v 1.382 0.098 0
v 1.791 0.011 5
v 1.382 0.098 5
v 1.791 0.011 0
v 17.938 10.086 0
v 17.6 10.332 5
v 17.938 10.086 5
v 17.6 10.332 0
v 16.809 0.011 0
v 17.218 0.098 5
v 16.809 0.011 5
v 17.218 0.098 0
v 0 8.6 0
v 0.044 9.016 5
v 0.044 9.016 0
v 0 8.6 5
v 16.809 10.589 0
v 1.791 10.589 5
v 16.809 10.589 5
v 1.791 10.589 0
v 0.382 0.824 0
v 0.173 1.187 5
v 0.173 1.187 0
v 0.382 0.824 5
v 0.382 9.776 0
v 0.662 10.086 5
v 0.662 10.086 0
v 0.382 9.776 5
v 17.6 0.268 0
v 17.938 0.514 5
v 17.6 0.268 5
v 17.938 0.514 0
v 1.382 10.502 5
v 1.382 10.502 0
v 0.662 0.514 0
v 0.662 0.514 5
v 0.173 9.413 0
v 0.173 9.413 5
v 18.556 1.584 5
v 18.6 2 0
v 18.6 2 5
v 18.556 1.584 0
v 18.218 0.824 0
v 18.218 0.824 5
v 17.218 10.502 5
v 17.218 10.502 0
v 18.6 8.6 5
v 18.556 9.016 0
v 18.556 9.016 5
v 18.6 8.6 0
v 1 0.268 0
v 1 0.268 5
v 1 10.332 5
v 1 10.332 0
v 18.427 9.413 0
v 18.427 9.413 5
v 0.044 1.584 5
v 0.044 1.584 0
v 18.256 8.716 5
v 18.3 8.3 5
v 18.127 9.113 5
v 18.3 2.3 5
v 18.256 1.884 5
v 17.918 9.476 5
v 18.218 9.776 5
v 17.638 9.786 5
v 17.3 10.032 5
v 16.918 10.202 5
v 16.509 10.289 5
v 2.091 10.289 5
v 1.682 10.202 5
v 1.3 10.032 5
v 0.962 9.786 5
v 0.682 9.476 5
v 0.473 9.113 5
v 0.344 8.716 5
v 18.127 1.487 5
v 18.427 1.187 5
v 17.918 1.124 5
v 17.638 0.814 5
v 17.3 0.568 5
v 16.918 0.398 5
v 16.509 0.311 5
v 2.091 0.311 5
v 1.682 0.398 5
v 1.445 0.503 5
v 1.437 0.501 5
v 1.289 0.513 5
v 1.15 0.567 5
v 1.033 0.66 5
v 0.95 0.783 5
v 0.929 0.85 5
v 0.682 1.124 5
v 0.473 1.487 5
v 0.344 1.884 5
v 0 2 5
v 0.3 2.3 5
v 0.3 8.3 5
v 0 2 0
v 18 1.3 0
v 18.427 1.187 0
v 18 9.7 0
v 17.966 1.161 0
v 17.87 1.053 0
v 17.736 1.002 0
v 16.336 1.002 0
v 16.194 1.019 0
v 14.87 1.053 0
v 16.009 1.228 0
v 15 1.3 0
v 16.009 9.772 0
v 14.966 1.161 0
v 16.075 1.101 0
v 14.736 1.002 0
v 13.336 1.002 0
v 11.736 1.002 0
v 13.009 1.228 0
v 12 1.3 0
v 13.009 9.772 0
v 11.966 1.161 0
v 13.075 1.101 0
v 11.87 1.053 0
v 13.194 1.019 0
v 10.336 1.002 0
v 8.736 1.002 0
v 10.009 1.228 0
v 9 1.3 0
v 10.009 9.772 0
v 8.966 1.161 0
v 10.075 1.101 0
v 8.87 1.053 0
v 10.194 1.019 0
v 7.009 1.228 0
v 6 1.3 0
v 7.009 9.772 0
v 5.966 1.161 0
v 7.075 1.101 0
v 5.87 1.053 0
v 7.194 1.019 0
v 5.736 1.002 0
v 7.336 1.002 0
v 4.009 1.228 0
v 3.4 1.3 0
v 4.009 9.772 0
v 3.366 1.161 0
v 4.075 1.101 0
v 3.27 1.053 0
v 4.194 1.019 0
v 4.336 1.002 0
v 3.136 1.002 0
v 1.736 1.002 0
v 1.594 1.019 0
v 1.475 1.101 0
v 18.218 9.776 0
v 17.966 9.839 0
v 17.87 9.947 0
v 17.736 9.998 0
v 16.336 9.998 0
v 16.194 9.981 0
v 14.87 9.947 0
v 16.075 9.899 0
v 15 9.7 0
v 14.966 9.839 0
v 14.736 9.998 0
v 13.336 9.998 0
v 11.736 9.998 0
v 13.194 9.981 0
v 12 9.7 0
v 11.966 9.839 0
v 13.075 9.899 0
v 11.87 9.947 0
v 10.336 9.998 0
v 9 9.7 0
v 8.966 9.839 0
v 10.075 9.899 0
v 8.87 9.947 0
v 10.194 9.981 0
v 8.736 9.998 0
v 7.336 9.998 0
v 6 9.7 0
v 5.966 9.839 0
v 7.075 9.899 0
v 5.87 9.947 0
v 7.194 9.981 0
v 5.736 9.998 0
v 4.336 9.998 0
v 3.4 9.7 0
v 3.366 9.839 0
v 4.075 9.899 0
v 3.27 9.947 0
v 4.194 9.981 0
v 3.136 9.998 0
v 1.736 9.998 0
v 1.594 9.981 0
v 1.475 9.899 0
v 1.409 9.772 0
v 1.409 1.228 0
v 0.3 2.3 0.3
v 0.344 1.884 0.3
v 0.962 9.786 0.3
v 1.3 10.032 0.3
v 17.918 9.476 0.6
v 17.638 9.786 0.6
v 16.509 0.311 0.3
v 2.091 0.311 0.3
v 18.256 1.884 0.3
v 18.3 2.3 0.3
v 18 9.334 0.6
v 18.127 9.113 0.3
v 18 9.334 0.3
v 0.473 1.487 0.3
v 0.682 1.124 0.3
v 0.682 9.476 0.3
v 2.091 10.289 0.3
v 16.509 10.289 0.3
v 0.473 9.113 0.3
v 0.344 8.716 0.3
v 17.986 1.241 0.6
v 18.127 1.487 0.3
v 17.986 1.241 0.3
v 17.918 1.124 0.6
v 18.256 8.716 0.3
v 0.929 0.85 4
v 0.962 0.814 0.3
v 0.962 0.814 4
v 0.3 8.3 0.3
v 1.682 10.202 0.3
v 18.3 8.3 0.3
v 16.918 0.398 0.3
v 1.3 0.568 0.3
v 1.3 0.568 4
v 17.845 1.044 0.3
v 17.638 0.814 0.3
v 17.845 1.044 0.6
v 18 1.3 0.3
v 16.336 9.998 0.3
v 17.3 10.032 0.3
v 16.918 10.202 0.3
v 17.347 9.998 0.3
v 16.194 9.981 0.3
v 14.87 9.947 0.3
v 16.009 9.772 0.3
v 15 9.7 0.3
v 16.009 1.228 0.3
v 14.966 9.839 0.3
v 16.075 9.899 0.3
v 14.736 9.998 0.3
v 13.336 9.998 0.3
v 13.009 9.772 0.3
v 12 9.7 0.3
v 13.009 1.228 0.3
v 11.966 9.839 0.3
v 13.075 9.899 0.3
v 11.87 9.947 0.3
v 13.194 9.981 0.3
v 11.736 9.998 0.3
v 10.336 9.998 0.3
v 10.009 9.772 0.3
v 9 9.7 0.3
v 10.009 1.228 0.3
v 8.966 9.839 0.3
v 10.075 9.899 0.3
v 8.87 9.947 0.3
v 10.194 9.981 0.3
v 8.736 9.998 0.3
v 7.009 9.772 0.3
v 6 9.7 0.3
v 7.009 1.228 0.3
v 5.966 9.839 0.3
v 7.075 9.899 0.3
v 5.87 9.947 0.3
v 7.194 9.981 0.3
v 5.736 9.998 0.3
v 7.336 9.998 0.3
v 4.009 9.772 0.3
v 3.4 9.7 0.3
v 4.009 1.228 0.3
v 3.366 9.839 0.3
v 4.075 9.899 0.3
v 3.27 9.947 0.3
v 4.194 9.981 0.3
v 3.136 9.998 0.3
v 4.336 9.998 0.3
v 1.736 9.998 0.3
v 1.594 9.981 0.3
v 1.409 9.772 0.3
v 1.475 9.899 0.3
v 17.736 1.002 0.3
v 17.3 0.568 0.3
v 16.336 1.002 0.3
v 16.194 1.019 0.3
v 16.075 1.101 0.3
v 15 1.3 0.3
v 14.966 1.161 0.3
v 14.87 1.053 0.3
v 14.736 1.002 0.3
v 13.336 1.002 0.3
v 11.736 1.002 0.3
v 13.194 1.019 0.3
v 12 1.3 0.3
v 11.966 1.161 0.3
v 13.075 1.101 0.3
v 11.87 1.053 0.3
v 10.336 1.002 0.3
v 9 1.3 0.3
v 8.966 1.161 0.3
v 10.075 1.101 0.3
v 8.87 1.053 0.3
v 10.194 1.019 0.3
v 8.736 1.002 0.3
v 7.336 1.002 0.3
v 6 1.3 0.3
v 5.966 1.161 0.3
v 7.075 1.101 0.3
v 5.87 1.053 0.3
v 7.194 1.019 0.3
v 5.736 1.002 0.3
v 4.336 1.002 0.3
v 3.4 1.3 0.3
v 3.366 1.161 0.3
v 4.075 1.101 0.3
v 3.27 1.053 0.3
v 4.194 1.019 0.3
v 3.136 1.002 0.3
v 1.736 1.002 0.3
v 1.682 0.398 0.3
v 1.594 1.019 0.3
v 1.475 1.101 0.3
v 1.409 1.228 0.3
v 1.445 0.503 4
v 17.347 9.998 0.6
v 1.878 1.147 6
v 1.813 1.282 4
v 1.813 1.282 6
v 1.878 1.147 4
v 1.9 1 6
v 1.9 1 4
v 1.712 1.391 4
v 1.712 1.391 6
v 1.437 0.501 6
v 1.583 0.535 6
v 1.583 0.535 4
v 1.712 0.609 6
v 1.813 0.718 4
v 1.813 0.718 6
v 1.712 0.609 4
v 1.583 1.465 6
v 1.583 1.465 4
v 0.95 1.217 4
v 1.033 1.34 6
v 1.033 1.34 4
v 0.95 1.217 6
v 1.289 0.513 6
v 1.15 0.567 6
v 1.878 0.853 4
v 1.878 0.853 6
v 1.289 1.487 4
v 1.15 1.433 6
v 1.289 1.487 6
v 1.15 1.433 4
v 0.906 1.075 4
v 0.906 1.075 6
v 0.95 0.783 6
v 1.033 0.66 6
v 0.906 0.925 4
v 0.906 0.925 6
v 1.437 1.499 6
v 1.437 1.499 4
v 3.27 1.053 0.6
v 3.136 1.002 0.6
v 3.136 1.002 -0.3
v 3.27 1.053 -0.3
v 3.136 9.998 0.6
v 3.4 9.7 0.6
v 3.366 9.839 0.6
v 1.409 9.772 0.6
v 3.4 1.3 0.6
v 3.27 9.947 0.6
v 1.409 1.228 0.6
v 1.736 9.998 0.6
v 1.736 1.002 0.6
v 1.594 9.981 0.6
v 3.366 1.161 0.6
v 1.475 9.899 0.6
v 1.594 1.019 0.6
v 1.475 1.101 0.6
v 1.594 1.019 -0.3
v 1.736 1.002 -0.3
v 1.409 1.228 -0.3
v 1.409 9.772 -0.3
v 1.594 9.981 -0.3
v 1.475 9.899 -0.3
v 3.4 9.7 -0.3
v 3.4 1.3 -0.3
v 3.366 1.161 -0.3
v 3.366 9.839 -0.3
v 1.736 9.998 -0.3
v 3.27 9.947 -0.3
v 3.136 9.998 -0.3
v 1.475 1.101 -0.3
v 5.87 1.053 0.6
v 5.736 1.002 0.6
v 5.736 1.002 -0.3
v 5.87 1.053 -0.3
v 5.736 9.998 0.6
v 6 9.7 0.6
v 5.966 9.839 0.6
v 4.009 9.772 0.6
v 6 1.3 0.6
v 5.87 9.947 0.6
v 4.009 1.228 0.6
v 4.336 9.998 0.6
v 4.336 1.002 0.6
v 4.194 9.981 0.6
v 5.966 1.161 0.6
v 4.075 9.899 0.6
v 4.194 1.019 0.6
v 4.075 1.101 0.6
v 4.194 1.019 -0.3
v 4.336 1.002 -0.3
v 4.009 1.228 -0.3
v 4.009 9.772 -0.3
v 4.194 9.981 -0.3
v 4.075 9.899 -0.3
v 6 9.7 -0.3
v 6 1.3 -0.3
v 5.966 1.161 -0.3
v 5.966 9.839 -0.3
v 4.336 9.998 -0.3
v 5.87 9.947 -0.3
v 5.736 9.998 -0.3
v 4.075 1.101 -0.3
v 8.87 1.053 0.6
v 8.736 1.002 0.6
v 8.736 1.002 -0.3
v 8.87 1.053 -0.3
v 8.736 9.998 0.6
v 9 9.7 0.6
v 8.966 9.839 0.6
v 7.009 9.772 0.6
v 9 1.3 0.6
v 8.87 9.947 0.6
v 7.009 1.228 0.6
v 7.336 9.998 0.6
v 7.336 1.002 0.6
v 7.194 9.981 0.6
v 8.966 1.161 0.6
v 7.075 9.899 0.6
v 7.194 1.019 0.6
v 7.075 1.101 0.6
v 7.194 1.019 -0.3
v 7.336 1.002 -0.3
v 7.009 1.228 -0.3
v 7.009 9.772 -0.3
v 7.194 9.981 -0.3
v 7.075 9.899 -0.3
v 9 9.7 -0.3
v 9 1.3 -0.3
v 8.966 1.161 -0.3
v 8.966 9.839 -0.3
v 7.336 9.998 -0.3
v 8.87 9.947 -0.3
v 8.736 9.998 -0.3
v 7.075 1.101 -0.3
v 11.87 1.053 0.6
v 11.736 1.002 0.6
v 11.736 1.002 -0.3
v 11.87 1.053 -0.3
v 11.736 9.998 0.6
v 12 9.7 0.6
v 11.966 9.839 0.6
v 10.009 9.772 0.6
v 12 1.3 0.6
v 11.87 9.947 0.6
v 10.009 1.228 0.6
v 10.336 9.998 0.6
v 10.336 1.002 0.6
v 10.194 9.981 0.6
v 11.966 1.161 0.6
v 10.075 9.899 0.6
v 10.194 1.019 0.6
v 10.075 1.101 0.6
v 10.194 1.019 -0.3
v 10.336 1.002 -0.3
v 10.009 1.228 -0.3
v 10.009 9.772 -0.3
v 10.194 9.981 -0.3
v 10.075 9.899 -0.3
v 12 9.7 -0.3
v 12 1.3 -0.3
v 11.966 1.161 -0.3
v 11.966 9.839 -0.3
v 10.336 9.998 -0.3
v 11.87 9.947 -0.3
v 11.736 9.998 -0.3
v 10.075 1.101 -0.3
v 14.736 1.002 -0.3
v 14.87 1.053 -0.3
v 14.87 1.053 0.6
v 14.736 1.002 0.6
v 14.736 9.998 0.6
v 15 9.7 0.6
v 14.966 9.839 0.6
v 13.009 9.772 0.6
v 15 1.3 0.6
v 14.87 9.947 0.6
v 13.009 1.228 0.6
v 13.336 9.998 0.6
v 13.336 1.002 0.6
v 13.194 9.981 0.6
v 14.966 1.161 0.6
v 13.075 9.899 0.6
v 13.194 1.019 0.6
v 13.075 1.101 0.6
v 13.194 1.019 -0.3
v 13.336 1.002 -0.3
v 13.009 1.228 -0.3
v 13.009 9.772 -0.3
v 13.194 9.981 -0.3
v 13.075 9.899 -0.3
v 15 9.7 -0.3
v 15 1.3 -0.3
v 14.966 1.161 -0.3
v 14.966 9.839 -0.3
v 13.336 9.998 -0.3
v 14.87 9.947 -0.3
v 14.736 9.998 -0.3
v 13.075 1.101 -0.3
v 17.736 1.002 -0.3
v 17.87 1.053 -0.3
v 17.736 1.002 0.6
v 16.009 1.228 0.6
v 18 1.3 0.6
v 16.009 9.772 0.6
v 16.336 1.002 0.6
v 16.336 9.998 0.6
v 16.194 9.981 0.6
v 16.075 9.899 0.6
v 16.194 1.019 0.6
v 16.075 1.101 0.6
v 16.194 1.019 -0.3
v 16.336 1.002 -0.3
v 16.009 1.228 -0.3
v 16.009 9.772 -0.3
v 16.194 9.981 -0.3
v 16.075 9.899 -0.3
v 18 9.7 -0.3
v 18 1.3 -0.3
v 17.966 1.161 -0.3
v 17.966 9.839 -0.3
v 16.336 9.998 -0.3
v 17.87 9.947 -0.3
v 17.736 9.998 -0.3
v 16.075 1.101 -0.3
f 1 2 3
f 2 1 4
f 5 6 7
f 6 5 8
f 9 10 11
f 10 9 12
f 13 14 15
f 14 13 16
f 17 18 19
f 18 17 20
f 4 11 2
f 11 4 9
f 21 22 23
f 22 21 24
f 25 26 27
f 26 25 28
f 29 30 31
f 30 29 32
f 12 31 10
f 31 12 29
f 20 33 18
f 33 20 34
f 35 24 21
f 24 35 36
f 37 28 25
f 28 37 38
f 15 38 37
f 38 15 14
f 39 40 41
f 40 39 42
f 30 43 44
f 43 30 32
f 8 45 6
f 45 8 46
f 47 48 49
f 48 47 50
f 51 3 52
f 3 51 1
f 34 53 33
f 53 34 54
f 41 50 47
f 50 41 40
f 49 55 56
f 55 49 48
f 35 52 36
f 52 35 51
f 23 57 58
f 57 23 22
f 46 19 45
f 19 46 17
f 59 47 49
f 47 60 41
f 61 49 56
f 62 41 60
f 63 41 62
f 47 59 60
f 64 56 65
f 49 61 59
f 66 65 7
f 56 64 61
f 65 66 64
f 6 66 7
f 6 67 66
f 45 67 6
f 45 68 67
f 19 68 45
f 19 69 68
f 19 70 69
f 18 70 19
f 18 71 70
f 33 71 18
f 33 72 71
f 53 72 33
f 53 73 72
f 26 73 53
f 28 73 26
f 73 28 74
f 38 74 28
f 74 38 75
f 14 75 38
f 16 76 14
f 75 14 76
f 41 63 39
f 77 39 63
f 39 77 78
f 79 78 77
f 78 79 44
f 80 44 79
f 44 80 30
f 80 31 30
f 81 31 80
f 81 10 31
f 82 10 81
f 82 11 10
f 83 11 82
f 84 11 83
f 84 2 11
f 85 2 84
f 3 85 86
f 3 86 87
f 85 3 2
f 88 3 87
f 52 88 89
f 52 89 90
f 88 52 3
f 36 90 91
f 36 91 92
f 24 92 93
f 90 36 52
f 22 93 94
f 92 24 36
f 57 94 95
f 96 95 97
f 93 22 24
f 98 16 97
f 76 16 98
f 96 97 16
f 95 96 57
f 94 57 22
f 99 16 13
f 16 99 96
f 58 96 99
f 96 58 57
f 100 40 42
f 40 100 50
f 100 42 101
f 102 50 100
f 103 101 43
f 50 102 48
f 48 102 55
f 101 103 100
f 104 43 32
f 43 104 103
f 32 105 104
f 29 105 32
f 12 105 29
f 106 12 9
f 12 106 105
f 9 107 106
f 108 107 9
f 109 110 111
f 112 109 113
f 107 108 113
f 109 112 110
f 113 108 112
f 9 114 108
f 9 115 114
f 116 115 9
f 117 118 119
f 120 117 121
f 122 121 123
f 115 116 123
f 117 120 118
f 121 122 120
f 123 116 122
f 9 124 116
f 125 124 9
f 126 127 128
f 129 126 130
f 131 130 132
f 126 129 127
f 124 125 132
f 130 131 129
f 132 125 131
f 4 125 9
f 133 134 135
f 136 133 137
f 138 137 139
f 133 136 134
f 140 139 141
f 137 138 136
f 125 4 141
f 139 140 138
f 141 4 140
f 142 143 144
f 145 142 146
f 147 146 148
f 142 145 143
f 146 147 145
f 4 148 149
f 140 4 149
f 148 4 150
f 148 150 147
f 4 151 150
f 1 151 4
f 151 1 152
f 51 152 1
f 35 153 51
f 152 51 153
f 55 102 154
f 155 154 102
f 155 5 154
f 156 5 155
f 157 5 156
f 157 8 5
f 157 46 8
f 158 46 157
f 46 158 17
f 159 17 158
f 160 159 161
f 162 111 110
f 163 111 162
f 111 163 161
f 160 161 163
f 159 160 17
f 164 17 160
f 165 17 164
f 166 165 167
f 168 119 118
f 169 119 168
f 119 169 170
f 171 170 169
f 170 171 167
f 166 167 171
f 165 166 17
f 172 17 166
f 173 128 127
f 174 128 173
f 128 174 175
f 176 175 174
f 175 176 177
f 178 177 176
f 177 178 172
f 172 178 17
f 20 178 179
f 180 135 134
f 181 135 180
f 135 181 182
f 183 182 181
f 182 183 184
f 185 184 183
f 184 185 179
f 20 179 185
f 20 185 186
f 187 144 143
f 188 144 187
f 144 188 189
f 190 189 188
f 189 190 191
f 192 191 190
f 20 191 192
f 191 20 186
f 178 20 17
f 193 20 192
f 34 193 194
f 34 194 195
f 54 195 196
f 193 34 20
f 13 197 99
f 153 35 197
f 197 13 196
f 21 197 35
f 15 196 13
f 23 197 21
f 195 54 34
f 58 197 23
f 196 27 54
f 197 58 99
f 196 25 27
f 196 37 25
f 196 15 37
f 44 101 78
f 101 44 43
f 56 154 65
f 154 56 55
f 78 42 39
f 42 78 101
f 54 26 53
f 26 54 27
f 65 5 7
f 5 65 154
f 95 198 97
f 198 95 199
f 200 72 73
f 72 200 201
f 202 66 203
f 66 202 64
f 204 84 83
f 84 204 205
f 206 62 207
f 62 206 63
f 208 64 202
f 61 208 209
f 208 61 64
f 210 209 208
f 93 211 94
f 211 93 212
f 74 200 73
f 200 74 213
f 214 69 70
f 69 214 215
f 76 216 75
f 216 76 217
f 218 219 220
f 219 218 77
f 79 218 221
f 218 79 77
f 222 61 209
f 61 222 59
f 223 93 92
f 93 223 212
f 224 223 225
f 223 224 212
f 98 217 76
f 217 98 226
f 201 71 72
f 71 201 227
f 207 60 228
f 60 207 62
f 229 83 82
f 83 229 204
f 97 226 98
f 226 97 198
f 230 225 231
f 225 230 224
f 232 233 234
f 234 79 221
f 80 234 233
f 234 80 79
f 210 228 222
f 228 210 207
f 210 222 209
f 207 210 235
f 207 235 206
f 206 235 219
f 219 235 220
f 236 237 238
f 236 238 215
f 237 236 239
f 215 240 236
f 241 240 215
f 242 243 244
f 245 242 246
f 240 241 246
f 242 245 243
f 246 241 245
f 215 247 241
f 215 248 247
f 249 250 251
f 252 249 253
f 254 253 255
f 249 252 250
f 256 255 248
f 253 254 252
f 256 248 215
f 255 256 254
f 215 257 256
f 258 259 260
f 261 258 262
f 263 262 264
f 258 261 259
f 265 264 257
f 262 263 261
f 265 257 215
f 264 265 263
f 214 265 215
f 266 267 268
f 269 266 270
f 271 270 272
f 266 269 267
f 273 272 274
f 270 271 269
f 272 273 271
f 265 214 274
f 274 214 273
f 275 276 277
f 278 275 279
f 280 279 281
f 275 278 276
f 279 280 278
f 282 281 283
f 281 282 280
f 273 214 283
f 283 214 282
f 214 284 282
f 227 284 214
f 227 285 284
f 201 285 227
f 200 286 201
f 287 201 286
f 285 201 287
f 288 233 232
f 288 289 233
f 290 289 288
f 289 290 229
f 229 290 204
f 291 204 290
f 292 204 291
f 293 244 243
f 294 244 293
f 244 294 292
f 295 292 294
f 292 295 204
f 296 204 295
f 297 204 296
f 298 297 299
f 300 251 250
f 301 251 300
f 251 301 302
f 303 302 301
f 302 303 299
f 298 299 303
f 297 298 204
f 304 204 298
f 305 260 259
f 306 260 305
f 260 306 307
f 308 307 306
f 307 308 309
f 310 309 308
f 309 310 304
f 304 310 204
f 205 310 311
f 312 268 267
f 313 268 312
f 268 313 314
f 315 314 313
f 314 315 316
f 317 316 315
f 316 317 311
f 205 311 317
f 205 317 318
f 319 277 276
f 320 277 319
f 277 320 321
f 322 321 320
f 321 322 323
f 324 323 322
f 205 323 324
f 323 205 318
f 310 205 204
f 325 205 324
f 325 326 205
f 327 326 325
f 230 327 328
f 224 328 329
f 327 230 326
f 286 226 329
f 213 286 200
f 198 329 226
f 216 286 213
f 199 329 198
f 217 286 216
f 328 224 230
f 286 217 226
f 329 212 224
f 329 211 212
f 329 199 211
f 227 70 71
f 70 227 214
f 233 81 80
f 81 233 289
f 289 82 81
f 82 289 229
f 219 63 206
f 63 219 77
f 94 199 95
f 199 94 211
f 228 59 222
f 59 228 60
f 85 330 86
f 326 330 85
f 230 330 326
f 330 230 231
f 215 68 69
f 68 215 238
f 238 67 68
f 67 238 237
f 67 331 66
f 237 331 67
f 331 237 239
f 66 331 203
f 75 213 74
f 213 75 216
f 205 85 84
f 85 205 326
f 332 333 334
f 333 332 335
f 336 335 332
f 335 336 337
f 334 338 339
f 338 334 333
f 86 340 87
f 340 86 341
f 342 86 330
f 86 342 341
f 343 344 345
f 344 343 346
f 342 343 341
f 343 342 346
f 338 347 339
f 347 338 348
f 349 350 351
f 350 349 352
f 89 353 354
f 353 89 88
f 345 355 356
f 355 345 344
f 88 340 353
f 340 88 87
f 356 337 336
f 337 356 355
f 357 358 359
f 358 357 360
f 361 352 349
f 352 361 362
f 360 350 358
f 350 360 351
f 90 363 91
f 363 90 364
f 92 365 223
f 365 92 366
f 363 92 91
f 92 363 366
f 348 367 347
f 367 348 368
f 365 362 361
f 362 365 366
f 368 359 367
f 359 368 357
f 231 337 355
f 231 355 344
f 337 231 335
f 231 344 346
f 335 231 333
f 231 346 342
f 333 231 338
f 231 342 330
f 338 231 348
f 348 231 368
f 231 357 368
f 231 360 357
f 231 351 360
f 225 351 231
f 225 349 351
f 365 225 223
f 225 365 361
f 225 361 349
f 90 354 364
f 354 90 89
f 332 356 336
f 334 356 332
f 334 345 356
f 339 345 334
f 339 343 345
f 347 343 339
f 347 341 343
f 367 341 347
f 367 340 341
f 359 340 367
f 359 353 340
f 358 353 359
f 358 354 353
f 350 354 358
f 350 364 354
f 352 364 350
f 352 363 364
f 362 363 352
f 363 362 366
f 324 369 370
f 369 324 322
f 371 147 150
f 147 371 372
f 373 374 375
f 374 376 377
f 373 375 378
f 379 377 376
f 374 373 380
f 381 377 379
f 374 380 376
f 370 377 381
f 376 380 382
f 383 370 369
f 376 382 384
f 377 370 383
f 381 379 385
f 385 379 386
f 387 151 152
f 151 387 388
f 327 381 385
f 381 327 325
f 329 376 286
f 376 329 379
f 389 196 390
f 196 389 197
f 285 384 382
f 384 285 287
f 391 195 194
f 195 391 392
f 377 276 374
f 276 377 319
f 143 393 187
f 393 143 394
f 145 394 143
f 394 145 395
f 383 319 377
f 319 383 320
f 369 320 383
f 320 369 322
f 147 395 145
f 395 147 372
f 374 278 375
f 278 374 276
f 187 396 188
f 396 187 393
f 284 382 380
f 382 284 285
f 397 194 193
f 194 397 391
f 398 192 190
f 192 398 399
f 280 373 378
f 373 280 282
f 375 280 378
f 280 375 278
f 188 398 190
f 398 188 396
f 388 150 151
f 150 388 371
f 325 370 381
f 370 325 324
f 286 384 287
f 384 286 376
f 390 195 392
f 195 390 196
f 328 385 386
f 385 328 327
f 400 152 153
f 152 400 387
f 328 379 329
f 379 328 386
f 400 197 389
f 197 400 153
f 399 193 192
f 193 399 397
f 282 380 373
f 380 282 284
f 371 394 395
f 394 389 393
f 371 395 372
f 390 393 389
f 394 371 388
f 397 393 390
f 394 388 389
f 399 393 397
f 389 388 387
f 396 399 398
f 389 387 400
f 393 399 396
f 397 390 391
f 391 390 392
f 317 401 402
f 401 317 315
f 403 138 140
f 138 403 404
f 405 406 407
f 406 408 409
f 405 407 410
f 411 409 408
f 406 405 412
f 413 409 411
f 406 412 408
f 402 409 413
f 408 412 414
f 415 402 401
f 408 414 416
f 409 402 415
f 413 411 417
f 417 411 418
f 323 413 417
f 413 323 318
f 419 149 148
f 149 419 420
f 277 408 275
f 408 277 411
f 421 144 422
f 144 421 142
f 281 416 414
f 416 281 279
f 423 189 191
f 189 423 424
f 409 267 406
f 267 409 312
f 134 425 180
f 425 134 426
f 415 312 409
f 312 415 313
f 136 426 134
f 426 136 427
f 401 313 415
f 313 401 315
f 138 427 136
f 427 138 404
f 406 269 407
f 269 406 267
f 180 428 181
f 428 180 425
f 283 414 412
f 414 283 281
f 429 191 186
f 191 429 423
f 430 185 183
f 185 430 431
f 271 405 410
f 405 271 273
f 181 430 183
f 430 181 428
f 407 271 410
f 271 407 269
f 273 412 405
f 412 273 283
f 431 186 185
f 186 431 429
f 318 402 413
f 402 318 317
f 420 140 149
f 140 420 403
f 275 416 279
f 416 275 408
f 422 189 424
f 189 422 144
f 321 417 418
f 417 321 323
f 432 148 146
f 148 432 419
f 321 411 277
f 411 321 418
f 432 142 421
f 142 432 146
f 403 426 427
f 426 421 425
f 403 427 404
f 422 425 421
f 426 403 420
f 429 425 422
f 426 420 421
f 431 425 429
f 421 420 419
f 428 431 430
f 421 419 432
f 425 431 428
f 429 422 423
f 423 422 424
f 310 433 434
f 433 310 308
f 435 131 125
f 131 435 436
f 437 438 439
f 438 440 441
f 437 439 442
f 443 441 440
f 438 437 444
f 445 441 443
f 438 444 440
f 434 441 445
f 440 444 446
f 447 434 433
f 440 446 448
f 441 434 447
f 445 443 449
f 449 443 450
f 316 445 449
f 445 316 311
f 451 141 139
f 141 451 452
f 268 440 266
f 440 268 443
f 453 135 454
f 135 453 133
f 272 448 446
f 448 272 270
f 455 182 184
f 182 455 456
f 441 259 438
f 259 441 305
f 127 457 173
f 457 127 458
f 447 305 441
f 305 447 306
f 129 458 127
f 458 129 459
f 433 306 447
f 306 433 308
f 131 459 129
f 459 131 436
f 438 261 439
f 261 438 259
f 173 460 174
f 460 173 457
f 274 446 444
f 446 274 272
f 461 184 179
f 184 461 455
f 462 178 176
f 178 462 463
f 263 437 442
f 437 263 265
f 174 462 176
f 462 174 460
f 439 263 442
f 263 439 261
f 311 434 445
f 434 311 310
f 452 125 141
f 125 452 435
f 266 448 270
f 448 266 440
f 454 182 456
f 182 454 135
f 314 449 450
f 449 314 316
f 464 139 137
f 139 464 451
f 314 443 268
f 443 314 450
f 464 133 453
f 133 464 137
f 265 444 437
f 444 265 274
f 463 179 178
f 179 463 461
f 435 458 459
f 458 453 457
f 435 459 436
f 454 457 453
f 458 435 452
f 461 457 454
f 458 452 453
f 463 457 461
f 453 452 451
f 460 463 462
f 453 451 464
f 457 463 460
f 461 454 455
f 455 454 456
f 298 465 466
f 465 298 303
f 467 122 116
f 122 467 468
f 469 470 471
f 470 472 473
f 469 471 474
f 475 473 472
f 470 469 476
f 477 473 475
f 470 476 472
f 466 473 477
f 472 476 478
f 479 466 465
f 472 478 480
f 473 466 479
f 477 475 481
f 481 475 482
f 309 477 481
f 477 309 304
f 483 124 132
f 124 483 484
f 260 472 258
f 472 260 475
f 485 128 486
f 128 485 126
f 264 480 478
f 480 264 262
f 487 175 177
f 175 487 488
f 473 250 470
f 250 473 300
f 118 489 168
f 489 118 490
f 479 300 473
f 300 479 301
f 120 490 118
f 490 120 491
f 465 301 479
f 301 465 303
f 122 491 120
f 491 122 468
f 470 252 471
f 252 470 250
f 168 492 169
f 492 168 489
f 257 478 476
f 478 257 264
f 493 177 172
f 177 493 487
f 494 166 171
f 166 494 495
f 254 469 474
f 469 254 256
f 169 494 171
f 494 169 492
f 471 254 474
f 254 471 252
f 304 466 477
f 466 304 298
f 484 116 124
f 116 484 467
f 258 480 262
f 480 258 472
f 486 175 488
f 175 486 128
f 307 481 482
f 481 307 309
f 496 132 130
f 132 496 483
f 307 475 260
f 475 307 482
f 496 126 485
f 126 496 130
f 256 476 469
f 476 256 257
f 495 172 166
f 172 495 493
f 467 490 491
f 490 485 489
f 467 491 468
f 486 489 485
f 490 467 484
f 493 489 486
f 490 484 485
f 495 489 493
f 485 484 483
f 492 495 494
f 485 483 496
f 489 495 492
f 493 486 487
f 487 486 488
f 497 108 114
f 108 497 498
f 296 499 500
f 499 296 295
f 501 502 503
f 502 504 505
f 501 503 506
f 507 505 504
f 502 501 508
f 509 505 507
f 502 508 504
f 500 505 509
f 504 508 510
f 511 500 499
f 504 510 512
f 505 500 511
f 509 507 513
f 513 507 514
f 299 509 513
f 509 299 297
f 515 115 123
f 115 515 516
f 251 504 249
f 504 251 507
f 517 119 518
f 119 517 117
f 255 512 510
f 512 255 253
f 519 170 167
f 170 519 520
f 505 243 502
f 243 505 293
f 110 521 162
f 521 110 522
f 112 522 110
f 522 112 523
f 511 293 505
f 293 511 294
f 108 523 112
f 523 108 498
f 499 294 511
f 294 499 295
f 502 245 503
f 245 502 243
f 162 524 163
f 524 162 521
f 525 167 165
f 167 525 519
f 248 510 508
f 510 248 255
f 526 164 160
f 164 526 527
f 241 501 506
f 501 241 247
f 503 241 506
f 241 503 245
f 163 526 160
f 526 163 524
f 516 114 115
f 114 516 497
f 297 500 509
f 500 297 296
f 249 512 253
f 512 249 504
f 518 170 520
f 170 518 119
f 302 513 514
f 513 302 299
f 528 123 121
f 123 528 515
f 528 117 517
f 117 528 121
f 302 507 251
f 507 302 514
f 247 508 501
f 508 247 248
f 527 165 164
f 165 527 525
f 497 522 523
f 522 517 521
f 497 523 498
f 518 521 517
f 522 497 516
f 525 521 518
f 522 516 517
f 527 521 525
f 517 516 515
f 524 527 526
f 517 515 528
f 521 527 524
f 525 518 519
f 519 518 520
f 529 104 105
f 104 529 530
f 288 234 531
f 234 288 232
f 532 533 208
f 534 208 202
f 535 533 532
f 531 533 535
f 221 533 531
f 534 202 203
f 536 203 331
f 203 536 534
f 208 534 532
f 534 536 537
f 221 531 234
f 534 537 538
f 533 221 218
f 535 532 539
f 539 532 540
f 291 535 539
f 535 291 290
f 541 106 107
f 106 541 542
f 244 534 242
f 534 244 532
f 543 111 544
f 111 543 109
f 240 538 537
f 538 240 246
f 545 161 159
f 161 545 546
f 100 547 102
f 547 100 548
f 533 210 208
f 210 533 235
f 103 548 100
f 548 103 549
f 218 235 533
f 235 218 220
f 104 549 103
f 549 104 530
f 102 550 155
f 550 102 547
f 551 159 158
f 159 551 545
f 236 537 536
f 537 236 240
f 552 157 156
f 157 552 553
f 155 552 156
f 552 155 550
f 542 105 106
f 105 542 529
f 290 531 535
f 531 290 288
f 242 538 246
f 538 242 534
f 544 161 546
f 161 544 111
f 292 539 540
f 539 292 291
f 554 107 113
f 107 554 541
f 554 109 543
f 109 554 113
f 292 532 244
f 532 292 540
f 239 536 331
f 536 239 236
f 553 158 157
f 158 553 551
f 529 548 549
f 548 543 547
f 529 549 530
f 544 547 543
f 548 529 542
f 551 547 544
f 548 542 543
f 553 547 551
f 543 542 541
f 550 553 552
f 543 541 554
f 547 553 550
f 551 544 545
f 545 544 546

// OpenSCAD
// An [x, y, z] vector specifies distance on each axis. Default [1, 1, 1]
//size = [2, 3, 5];

// An integer creates a cube with specified wall distance. Default [1, 1, 1]
//size = 5;

// Whether or not to place the object centered on the origin. Default false
//center = true|false;

// Specify a rounding radius. Default 0.5
radius = 0.5;

// Specify where to apply the rounded corners. Default "all"
//apply_to = "all"|"x"|"y"|"z"|"zmax"|"zmin"|"xmax"|"xmin"|"ymax"|"ymin";


translate([1.4, 1, 4]) {
    cylinder(2, 0.5,0.5);
}
translate(v = [1.4, 1, 0])
    color("grey")
    roundedcube([2, 9, 0.3],    false, 0.3, "y" || "z");

translate(v = [4, 1, 0])
    color("grey")
    roundedcube([2, 9, 0.3],    false, 0.3, "y" || "z");
translate(v = [7, 1, 0])
    color("grey")
    roundedcube([2, 9, 0.3],    false, 0.3, "y" || "z");

translate(v = [10, 1, 0])
    color("grey")
    roundedcube([2, 9, 0.3],    false, 0.3, "y" || "z");
    
translate(v = [13, 1, 0])
    color("grey")
    roundedcube([2, 9, 0.3],    false, 0.3, "y" || "z");

translate(v = [16, 1, 0])
    color("grey")
    roundedcube([2, 9, 0.3],    false, 0.3, "y" || "z");
difference() {

    color("darkgrey")
    roundedcube([18.6, 10.6, 5],    false, 2, "y" || "z");
    
    translate(v = [0.3, 0.3, 0.3])
    color("grey")
    roundedcube([18, 10, 11],    false, 2, "y" || "z");
    
}
// Set to 0.01 for higher definition curves (renders slower)
$fs = 0.15;

module roundedcube(size = [1, 1, 1], center = false, radius = 0.5, apply_to = "all") {
	// If single value, convert to [x, y, z] vector
	size = (size[0] == undef) ? [size, size, size] : size;

	translate_min = radius;
	translate_xmax = size[0] - radius;
	translate_ymax = size[1] - radius;
	translate_zmax = size[2] - radius;

	diameter = radius * 2;

	obj_translate = (center == false) ?
		[0, 0, 0] : [
			-(size[0] / 2),
			-(size[1] / 2),
			-(size[2] / 2)
		];

	translate(v = obj_translate) {
		hull() {
			for (translate_x = [translate_min, translate_xmax]) {
				x_at = (translate_x == translate_min) ? "min" : "max";
				for (translate_y = [translate_min, translate_ymax]) {
					y_at = (translate_y == translate_min) ? "min" : "max";
					for (translate_z = [translate_min, translate_zmax]) {
						z_at = (translate_z == translate_min) ? "min" : "max";

						translate(v = [translate_x, translate_y, translate_z])
						if (
							(apply_to == "all") ||
							(apply_to == "xmin" && x_at == "min") || (apply_to == "xmax" && x_at == "max") ||
							(apply_to == "ymin" && y_at == "min") || (apply_to == "ymax" && y_at == "max") ||
							(apply_to == "zmin" && z_at == "min") || (apply_to == "zmax" && z_at == "max")
						) {
							sphere(r = radius);
						} else {
							rotate = 
								(apply_to == "xmin" || apply_to == "xmax" || apply_to == "x") ? [0, 90, 0] : (
								(apply_to == "ymin" || apply_to == "ymax" || apply_to == "y") ? [90, 90, 0] :
								[0, 0, 0]
							);
							rotate(a = rotate)
							cylinder(h = diameter, r = radius, center = true);
						}
					}
				}
			}
		}
	}
}
